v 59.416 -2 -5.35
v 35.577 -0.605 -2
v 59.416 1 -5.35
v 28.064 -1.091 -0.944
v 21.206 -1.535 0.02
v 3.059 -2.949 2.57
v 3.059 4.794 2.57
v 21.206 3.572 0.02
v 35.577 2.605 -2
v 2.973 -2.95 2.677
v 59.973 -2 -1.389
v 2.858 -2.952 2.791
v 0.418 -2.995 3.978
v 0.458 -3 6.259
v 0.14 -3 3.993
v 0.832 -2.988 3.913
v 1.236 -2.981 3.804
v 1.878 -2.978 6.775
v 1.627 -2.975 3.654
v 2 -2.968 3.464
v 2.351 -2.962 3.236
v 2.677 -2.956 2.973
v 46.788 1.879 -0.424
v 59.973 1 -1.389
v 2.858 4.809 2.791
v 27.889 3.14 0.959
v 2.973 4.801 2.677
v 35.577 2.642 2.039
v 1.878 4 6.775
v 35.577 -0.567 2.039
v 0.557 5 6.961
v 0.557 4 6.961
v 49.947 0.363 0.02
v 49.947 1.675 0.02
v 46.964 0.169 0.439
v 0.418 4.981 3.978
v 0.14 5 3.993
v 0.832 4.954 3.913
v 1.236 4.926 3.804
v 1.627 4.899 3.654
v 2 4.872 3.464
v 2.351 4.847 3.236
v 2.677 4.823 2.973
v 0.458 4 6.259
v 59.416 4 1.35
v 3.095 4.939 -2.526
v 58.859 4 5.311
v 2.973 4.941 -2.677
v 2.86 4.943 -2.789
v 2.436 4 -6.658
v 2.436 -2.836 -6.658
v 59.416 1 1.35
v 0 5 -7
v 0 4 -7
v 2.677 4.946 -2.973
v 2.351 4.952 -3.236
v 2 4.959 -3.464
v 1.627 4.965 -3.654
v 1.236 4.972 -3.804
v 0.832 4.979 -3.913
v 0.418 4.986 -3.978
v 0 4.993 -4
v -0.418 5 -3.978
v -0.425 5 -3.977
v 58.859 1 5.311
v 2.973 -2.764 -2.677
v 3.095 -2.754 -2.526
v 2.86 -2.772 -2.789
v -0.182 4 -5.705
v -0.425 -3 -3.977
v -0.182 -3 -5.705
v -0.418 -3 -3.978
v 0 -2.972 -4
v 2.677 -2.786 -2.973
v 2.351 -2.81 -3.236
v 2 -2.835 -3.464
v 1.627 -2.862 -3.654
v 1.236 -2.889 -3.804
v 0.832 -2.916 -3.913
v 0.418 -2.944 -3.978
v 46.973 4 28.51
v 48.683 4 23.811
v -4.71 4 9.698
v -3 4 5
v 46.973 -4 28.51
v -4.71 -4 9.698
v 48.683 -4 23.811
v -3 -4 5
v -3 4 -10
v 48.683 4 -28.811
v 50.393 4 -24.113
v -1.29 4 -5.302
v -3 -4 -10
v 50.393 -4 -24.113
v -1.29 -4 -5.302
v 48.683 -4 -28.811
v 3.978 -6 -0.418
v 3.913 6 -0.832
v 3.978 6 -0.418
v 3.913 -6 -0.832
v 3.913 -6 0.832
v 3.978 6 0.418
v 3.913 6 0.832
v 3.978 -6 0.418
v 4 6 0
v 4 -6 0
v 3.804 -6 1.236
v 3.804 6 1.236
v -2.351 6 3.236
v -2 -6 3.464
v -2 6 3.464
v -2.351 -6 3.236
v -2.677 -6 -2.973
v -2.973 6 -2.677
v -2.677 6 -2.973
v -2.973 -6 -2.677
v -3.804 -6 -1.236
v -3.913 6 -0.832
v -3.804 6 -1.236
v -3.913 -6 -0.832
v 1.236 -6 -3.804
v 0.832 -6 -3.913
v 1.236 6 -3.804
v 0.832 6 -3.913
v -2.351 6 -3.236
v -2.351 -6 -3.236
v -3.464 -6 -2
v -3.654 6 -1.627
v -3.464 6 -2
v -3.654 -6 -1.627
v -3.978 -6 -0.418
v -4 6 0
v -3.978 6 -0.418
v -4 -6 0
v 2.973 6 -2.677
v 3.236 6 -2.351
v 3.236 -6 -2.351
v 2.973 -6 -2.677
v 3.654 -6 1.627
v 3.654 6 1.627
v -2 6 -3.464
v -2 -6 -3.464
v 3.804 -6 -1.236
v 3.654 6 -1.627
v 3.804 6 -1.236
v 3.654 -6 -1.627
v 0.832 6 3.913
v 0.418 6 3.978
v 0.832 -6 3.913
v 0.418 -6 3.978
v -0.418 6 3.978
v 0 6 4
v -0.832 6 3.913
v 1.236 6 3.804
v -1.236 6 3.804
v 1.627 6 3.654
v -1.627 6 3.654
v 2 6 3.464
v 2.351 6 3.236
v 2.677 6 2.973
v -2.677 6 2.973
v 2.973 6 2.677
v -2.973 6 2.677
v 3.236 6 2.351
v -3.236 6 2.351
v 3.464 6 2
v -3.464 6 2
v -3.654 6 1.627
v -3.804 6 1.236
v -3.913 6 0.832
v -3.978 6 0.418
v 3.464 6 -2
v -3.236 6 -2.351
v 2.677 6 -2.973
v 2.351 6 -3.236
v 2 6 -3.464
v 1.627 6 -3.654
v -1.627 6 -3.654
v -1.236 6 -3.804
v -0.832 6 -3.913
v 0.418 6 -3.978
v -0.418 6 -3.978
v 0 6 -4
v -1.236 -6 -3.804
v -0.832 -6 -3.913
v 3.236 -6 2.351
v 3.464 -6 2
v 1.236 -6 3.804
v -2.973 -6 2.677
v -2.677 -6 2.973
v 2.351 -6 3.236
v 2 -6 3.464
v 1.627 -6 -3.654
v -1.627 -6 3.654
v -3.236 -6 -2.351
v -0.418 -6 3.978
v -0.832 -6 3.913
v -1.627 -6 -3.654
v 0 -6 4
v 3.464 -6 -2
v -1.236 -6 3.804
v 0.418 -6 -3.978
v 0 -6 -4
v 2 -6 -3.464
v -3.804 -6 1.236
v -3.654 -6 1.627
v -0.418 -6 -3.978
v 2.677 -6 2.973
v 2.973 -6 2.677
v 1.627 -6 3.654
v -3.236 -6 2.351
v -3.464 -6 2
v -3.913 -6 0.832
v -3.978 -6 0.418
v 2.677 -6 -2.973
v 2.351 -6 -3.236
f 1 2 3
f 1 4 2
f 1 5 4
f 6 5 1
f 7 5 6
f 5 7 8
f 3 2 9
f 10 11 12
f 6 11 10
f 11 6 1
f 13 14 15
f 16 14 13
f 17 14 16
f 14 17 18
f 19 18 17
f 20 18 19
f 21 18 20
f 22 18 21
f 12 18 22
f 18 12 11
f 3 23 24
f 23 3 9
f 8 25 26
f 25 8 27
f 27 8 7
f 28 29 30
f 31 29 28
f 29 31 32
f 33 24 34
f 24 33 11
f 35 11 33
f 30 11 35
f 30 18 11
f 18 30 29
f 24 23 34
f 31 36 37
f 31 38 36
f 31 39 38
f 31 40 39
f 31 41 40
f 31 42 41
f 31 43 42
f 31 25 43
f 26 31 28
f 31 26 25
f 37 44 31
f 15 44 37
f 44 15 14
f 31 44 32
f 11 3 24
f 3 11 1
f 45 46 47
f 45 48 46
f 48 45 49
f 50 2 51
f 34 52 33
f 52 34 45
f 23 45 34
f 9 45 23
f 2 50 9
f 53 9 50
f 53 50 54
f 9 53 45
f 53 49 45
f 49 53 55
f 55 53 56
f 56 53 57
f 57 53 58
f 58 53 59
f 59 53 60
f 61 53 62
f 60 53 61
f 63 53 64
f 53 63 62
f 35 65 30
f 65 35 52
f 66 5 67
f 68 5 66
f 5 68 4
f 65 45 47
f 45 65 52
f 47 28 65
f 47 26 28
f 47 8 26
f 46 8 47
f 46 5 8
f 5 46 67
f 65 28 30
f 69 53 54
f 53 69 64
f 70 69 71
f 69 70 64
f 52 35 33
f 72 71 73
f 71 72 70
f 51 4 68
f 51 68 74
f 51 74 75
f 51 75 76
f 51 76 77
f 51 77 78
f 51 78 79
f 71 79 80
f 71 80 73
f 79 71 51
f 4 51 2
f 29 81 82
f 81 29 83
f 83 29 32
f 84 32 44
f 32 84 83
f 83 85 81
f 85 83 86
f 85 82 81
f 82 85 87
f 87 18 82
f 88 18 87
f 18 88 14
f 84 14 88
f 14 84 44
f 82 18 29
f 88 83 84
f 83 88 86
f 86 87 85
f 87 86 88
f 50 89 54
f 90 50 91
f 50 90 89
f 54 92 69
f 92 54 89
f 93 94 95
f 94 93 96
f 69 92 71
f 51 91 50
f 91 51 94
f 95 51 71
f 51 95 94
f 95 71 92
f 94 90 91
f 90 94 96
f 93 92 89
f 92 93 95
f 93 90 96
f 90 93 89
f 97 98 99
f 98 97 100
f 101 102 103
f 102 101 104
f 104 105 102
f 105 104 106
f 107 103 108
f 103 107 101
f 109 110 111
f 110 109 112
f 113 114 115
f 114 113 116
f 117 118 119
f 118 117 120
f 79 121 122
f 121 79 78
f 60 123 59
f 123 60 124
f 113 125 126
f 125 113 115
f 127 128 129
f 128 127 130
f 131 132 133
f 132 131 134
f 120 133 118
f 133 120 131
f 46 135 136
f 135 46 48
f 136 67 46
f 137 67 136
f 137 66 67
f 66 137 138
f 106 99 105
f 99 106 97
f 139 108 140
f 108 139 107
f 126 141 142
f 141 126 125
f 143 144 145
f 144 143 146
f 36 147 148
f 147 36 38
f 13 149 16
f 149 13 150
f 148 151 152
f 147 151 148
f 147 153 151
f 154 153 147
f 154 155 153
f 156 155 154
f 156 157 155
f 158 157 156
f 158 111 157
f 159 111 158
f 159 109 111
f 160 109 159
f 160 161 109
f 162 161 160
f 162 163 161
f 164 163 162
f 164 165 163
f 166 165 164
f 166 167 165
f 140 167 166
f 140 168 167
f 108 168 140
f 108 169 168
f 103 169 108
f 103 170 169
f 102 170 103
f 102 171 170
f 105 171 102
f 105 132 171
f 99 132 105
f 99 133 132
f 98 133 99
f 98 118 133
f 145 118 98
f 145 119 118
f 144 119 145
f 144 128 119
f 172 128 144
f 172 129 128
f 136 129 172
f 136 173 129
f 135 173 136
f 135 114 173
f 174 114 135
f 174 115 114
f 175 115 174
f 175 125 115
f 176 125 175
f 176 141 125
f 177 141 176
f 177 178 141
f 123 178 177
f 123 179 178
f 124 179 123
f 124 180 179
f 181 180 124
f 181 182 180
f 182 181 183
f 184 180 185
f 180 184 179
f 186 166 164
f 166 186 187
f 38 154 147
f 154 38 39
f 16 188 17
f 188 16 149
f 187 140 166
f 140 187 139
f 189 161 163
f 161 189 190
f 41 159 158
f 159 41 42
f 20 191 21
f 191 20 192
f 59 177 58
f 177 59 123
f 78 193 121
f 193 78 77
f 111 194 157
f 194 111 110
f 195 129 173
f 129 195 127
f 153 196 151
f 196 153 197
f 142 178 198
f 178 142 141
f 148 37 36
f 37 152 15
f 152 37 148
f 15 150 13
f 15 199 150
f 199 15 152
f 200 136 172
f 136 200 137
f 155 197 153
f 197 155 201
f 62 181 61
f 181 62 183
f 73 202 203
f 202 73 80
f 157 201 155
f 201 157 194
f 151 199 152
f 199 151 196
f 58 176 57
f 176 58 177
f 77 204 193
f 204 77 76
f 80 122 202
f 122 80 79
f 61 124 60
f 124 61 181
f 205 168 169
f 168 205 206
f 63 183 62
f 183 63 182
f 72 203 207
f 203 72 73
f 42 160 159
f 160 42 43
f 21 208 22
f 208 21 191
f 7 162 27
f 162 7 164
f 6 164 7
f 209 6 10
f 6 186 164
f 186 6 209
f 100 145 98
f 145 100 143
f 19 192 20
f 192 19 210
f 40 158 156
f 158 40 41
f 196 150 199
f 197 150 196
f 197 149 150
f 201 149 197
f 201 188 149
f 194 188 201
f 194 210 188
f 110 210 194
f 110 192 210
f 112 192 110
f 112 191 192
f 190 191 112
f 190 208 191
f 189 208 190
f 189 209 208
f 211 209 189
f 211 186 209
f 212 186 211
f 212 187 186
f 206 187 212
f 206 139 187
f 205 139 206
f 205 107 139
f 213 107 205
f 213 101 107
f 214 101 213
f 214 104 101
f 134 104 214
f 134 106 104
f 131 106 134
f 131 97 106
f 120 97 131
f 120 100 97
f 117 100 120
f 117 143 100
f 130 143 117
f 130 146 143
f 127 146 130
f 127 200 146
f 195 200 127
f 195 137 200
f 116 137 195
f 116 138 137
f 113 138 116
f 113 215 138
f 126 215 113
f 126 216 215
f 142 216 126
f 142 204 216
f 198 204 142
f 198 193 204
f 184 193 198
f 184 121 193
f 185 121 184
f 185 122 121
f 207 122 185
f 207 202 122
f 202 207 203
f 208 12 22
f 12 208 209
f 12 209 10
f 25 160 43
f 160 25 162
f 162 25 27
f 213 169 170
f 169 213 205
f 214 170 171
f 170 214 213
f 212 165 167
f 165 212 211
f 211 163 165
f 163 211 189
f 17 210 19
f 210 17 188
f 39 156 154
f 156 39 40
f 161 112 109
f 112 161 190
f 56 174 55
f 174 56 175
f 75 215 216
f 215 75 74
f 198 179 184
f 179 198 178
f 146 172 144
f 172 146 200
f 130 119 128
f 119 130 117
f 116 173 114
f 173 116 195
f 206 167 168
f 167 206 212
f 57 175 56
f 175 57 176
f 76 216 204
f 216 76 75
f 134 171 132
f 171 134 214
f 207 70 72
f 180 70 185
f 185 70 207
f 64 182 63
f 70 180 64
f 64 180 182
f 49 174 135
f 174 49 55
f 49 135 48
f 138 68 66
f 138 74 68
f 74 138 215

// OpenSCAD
// file: _common.scad
// mechanism 共用設定 + 齒輪 module
$fn = 60;

// 簡化齒輪：N 個齒、節圓半徑 r、齒高 h、齒寬 w
module simple_gear(N = 16, r = 20, h = 4, thick = 6) {
  union() {
    // 主圓盤
    cylinder(h = thick, r = r, center = true);
    // 齒（梯形）
    for (i = [0:N-1]) {
      rotate([0, 0, i * 360 / N])
        translate([r, 0, 0])
          linear_extrude(height = thick, center = true)
            polygon([[0, -2.4], [h, -1.4], [h, 1.4], [0, 2.4]]);
    }
    // 中心凸軸
    cylinder(h = thick * 1.4, r = r * 0.18, center = true);
  }
}
// main file
// 鉗類 Pliers — 紅色塑膠握把 + 鋼鉗口（尖嘴鉗）
include <_common.scad>

// 中央銷（樞軸）
color([0.18, 0.18, 0.18])
  rotate([90, 0, 0]) cylinder(h = 12, r = 4, center = true);

// 兩根鉗口（從中央銷往前延伸）
color([0.55, 0.55, 0.55]) {
  // 上鉗口
  translate([0, -3, 3]) rotate([0, 8, 0])
    linear_extrude(height = 4)
      polygon([[0, 0], [60, 1], [60, 4], [0, 8]]);
  // 下鉗口
  translate([0, -3, -7]) rotate([0, -8, 0])
    linear_extrude(height = 4)
      polygon([[0, 0], [60, 4], [60, 7], [0, 8]]);
}

// 兩根握把（從銷往後延伸 + 紅色塑膠套）
color([0.86, 0.15, 0.15]) {
  // 上握把（紅）
  translate([-3, -4, 5]) rotate([0, -20, 0])
    cube([55, 8, 5]);
  // 下握把
  translate([-3, -4, -10]) rotate([0, 20, 0])
    cube([55, 8, 5]);
}
